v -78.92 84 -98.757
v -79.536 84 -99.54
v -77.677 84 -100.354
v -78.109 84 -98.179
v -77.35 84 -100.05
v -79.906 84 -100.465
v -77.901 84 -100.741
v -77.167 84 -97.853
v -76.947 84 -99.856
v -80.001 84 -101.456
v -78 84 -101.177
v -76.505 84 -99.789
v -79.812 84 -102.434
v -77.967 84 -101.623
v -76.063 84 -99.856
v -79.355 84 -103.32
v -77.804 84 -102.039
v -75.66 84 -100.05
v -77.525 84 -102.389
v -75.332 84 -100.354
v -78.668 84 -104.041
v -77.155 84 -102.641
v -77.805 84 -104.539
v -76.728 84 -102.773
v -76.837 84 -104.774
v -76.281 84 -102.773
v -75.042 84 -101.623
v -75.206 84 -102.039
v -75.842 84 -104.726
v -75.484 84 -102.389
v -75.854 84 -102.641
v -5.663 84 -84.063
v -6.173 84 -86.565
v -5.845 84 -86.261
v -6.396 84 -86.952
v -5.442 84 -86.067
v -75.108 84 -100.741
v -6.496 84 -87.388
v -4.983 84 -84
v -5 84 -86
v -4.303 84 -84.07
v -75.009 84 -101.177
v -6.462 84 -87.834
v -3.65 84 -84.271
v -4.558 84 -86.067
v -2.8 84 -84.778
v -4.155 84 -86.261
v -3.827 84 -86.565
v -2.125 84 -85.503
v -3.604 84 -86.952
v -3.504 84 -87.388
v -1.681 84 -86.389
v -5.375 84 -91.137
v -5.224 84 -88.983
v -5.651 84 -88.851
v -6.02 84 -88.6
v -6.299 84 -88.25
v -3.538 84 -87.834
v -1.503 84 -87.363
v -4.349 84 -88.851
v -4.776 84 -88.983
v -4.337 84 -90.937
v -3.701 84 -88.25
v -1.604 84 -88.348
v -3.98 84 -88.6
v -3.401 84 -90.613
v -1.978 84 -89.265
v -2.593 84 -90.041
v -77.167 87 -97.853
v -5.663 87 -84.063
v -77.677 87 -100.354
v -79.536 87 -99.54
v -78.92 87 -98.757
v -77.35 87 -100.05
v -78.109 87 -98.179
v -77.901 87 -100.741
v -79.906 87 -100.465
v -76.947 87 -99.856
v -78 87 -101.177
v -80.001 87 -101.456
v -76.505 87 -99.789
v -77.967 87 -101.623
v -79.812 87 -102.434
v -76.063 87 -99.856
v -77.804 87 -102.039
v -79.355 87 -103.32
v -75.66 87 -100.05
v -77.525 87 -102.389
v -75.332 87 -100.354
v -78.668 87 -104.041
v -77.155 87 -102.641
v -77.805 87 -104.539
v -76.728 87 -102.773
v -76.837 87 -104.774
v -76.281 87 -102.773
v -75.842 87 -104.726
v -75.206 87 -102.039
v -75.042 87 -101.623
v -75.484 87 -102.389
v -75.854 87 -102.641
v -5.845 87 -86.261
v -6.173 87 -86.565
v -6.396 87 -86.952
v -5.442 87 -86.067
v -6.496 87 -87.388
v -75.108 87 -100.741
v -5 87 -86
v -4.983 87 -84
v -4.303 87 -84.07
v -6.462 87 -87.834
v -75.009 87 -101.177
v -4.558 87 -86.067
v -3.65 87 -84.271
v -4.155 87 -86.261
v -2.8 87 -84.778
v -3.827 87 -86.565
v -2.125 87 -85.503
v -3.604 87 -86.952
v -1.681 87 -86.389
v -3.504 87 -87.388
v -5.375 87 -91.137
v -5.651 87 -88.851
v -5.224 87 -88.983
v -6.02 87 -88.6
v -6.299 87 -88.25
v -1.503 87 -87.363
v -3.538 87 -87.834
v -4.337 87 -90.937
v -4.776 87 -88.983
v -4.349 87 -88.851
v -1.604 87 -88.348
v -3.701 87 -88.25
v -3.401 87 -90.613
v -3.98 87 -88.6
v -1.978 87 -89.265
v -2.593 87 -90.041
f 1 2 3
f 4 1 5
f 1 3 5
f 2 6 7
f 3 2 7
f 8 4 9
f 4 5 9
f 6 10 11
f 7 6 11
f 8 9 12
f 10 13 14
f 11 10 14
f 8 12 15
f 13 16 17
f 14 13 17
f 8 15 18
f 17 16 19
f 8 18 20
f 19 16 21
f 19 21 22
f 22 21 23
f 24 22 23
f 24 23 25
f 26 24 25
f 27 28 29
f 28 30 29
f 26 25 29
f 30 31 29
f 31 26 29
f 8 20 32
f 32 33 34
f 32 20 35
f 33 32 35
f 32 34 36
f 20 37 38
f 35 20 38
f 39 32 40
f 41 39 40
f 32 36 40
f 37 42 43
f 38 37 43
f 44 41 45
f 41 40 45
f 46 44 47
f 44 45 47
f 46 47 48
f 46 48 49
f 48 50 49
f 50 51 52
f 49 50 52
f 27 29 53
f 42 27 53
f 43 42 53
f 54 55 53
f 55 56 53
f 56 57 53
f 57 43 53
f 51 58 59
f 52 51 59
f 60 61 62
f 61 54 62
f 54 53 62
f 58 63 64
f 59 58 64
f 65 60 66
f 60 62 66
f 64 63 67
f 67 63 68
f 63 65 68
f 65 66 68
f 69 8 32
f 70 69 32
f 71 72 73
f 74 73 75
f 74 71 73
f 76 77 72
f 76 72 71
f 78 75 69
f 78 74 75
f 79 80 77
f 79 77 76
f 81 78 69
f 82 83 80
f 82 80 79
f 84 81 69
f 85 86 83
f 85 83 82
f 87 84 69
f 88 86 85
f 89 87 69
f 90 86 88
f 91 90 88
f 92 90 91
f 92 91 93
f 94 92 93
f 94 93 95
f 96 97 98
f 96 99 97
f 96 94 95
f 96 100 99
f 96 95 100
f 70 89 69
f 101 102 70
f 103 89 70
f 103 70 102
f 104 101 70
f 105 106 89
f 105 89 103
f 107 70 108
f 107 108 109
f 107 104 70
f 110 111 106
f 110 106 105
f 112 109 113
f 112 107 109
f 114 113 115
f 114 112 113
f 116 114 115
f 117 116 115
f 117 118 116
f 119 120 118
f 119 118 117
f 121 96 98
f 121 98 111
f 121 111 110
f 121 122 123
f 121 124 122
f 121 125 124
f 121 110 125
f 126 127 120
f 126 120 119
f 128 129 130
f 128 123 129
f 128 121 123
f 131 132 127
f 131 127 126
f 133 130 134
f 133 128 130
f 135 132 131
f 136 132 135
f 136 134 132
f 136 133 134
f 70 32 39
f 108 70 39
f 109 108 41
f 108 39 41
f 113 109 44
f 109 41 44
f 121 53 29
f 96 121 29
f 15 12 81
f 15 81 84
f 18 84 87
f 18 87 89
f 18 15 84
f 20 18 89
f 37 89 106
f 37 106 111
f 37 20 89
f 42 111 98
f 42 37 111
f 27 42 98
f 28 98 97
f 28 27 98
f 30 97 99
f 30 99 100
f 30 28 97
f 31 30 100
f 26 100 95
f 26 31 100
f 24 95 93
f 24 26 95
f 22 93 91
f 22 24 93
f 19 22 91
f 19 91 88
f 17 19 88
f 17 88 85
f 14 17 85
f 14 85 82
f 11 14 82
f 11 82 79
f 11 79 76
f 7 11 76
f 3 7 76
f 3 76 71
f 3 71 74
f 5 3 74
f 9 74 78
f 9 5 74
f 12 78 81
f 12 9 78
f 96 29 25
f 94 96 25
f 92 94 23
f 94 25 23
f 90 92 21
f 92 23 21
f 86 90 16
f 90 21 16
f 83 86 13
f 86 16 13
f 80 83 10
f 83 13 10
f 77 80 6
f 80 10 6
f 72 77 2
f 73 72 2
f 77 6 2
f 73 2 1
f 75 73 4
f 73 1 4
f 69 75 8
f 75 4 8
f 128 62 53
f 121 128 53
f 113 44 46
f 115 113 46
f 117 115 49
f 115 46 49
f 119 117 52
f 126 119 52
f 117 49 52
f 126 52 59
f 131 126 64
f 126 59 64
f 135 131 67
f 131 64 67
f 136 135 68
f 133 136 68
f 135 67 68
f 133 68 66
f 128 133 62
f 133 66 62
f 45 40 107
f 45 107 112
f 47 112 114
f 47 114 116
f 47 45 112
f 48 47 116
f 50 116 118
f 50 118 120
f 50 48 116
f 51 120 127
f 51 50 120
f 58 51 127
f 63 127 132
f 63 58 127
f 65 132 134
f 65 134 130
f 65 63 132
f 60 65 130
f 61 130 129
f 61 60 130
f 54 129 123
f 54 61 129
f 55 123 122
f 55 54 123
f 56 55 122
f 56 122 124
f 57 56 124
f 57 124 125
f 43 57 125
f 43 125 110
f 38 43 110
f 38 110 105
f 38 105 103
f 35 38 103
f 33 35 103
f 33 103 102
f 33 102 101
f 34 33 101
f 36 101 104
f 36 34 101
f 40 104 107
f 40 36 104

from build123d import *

# Parameters (mm, degrees)
SKETCH2_R           = 1.5
BOSS_EXTRUDE2_DEPTH = 3


with BuildPart() as part:
    # Sketch2 → Boss-Extrude2 (new body)
    # profile 1 of 2: a face of its own
    with BuildSketch(Plane(origin=(0, 84, 0), x_dir=(1, 0, 0), z_dir=(0, 1, 0))):
        with BuildLine():
            ThreePointArc((-6.349779829, 90.729255992), (-8.48155795, 87.141170391), (-5.66275018, 84.063320655))
            ThreePointArc((-5.66275018, 84.063320655), (-4.641171279, 84.018442382), (-3.65022139, 84.270743452))
            ThreePointArc((-3.65022139, 84.270743452), (-1.51844327, 87.858829053), (-4.33725104, 90.936678789))
            Line((-4.33725104, 90.936678789), (-5.374827195, 91.136771127))
            Line((-5.374827195, 91.136771127), (-6.349779829, 90.729255992))
        make_face()
        with Locations(Location((-5.00000061, 87.499999722, 0), (0, 0, 270))):
            Circle(SKETCH2_R, mode=Mode.SUBTRACT)
    # profile 2 of 2: a face of its own
    with BuildSketch(Plane(origin=(0, 84, 0), x_dir=(1, 0, 0), z_dir=(0, 1, 0))):
        with BuildLine():
            Line((-77.167393969, 97.852700174), (-5.66275018, 84.063320655))
            ThreePointArc((-5.66275018, 84.063320655), (-8.48155795, 87.141170391), (-6.349779829, 90.729255992))
            Line((-6.349779829, 90.729255992), (-5.374827195, 91.136771127))
            Line((-5.374827195, 91.136771127), (-75.841894829, 104.726058307))
            ThreePointArc((-75.841894829, 104.726058307), (-79.941323466, 101.952128811), (-77.167393969, 97.852700174))
        make_face()
        with Locations(Location((-76.504644399, 101.28937924, 0), (0, 0, 270))):
            Circle(SKETCH2_R, mode=Mode.SUBTRACT)
    extrude(amount=BOSS_EXTRUDE2_DEPTH)


solid = part.part
